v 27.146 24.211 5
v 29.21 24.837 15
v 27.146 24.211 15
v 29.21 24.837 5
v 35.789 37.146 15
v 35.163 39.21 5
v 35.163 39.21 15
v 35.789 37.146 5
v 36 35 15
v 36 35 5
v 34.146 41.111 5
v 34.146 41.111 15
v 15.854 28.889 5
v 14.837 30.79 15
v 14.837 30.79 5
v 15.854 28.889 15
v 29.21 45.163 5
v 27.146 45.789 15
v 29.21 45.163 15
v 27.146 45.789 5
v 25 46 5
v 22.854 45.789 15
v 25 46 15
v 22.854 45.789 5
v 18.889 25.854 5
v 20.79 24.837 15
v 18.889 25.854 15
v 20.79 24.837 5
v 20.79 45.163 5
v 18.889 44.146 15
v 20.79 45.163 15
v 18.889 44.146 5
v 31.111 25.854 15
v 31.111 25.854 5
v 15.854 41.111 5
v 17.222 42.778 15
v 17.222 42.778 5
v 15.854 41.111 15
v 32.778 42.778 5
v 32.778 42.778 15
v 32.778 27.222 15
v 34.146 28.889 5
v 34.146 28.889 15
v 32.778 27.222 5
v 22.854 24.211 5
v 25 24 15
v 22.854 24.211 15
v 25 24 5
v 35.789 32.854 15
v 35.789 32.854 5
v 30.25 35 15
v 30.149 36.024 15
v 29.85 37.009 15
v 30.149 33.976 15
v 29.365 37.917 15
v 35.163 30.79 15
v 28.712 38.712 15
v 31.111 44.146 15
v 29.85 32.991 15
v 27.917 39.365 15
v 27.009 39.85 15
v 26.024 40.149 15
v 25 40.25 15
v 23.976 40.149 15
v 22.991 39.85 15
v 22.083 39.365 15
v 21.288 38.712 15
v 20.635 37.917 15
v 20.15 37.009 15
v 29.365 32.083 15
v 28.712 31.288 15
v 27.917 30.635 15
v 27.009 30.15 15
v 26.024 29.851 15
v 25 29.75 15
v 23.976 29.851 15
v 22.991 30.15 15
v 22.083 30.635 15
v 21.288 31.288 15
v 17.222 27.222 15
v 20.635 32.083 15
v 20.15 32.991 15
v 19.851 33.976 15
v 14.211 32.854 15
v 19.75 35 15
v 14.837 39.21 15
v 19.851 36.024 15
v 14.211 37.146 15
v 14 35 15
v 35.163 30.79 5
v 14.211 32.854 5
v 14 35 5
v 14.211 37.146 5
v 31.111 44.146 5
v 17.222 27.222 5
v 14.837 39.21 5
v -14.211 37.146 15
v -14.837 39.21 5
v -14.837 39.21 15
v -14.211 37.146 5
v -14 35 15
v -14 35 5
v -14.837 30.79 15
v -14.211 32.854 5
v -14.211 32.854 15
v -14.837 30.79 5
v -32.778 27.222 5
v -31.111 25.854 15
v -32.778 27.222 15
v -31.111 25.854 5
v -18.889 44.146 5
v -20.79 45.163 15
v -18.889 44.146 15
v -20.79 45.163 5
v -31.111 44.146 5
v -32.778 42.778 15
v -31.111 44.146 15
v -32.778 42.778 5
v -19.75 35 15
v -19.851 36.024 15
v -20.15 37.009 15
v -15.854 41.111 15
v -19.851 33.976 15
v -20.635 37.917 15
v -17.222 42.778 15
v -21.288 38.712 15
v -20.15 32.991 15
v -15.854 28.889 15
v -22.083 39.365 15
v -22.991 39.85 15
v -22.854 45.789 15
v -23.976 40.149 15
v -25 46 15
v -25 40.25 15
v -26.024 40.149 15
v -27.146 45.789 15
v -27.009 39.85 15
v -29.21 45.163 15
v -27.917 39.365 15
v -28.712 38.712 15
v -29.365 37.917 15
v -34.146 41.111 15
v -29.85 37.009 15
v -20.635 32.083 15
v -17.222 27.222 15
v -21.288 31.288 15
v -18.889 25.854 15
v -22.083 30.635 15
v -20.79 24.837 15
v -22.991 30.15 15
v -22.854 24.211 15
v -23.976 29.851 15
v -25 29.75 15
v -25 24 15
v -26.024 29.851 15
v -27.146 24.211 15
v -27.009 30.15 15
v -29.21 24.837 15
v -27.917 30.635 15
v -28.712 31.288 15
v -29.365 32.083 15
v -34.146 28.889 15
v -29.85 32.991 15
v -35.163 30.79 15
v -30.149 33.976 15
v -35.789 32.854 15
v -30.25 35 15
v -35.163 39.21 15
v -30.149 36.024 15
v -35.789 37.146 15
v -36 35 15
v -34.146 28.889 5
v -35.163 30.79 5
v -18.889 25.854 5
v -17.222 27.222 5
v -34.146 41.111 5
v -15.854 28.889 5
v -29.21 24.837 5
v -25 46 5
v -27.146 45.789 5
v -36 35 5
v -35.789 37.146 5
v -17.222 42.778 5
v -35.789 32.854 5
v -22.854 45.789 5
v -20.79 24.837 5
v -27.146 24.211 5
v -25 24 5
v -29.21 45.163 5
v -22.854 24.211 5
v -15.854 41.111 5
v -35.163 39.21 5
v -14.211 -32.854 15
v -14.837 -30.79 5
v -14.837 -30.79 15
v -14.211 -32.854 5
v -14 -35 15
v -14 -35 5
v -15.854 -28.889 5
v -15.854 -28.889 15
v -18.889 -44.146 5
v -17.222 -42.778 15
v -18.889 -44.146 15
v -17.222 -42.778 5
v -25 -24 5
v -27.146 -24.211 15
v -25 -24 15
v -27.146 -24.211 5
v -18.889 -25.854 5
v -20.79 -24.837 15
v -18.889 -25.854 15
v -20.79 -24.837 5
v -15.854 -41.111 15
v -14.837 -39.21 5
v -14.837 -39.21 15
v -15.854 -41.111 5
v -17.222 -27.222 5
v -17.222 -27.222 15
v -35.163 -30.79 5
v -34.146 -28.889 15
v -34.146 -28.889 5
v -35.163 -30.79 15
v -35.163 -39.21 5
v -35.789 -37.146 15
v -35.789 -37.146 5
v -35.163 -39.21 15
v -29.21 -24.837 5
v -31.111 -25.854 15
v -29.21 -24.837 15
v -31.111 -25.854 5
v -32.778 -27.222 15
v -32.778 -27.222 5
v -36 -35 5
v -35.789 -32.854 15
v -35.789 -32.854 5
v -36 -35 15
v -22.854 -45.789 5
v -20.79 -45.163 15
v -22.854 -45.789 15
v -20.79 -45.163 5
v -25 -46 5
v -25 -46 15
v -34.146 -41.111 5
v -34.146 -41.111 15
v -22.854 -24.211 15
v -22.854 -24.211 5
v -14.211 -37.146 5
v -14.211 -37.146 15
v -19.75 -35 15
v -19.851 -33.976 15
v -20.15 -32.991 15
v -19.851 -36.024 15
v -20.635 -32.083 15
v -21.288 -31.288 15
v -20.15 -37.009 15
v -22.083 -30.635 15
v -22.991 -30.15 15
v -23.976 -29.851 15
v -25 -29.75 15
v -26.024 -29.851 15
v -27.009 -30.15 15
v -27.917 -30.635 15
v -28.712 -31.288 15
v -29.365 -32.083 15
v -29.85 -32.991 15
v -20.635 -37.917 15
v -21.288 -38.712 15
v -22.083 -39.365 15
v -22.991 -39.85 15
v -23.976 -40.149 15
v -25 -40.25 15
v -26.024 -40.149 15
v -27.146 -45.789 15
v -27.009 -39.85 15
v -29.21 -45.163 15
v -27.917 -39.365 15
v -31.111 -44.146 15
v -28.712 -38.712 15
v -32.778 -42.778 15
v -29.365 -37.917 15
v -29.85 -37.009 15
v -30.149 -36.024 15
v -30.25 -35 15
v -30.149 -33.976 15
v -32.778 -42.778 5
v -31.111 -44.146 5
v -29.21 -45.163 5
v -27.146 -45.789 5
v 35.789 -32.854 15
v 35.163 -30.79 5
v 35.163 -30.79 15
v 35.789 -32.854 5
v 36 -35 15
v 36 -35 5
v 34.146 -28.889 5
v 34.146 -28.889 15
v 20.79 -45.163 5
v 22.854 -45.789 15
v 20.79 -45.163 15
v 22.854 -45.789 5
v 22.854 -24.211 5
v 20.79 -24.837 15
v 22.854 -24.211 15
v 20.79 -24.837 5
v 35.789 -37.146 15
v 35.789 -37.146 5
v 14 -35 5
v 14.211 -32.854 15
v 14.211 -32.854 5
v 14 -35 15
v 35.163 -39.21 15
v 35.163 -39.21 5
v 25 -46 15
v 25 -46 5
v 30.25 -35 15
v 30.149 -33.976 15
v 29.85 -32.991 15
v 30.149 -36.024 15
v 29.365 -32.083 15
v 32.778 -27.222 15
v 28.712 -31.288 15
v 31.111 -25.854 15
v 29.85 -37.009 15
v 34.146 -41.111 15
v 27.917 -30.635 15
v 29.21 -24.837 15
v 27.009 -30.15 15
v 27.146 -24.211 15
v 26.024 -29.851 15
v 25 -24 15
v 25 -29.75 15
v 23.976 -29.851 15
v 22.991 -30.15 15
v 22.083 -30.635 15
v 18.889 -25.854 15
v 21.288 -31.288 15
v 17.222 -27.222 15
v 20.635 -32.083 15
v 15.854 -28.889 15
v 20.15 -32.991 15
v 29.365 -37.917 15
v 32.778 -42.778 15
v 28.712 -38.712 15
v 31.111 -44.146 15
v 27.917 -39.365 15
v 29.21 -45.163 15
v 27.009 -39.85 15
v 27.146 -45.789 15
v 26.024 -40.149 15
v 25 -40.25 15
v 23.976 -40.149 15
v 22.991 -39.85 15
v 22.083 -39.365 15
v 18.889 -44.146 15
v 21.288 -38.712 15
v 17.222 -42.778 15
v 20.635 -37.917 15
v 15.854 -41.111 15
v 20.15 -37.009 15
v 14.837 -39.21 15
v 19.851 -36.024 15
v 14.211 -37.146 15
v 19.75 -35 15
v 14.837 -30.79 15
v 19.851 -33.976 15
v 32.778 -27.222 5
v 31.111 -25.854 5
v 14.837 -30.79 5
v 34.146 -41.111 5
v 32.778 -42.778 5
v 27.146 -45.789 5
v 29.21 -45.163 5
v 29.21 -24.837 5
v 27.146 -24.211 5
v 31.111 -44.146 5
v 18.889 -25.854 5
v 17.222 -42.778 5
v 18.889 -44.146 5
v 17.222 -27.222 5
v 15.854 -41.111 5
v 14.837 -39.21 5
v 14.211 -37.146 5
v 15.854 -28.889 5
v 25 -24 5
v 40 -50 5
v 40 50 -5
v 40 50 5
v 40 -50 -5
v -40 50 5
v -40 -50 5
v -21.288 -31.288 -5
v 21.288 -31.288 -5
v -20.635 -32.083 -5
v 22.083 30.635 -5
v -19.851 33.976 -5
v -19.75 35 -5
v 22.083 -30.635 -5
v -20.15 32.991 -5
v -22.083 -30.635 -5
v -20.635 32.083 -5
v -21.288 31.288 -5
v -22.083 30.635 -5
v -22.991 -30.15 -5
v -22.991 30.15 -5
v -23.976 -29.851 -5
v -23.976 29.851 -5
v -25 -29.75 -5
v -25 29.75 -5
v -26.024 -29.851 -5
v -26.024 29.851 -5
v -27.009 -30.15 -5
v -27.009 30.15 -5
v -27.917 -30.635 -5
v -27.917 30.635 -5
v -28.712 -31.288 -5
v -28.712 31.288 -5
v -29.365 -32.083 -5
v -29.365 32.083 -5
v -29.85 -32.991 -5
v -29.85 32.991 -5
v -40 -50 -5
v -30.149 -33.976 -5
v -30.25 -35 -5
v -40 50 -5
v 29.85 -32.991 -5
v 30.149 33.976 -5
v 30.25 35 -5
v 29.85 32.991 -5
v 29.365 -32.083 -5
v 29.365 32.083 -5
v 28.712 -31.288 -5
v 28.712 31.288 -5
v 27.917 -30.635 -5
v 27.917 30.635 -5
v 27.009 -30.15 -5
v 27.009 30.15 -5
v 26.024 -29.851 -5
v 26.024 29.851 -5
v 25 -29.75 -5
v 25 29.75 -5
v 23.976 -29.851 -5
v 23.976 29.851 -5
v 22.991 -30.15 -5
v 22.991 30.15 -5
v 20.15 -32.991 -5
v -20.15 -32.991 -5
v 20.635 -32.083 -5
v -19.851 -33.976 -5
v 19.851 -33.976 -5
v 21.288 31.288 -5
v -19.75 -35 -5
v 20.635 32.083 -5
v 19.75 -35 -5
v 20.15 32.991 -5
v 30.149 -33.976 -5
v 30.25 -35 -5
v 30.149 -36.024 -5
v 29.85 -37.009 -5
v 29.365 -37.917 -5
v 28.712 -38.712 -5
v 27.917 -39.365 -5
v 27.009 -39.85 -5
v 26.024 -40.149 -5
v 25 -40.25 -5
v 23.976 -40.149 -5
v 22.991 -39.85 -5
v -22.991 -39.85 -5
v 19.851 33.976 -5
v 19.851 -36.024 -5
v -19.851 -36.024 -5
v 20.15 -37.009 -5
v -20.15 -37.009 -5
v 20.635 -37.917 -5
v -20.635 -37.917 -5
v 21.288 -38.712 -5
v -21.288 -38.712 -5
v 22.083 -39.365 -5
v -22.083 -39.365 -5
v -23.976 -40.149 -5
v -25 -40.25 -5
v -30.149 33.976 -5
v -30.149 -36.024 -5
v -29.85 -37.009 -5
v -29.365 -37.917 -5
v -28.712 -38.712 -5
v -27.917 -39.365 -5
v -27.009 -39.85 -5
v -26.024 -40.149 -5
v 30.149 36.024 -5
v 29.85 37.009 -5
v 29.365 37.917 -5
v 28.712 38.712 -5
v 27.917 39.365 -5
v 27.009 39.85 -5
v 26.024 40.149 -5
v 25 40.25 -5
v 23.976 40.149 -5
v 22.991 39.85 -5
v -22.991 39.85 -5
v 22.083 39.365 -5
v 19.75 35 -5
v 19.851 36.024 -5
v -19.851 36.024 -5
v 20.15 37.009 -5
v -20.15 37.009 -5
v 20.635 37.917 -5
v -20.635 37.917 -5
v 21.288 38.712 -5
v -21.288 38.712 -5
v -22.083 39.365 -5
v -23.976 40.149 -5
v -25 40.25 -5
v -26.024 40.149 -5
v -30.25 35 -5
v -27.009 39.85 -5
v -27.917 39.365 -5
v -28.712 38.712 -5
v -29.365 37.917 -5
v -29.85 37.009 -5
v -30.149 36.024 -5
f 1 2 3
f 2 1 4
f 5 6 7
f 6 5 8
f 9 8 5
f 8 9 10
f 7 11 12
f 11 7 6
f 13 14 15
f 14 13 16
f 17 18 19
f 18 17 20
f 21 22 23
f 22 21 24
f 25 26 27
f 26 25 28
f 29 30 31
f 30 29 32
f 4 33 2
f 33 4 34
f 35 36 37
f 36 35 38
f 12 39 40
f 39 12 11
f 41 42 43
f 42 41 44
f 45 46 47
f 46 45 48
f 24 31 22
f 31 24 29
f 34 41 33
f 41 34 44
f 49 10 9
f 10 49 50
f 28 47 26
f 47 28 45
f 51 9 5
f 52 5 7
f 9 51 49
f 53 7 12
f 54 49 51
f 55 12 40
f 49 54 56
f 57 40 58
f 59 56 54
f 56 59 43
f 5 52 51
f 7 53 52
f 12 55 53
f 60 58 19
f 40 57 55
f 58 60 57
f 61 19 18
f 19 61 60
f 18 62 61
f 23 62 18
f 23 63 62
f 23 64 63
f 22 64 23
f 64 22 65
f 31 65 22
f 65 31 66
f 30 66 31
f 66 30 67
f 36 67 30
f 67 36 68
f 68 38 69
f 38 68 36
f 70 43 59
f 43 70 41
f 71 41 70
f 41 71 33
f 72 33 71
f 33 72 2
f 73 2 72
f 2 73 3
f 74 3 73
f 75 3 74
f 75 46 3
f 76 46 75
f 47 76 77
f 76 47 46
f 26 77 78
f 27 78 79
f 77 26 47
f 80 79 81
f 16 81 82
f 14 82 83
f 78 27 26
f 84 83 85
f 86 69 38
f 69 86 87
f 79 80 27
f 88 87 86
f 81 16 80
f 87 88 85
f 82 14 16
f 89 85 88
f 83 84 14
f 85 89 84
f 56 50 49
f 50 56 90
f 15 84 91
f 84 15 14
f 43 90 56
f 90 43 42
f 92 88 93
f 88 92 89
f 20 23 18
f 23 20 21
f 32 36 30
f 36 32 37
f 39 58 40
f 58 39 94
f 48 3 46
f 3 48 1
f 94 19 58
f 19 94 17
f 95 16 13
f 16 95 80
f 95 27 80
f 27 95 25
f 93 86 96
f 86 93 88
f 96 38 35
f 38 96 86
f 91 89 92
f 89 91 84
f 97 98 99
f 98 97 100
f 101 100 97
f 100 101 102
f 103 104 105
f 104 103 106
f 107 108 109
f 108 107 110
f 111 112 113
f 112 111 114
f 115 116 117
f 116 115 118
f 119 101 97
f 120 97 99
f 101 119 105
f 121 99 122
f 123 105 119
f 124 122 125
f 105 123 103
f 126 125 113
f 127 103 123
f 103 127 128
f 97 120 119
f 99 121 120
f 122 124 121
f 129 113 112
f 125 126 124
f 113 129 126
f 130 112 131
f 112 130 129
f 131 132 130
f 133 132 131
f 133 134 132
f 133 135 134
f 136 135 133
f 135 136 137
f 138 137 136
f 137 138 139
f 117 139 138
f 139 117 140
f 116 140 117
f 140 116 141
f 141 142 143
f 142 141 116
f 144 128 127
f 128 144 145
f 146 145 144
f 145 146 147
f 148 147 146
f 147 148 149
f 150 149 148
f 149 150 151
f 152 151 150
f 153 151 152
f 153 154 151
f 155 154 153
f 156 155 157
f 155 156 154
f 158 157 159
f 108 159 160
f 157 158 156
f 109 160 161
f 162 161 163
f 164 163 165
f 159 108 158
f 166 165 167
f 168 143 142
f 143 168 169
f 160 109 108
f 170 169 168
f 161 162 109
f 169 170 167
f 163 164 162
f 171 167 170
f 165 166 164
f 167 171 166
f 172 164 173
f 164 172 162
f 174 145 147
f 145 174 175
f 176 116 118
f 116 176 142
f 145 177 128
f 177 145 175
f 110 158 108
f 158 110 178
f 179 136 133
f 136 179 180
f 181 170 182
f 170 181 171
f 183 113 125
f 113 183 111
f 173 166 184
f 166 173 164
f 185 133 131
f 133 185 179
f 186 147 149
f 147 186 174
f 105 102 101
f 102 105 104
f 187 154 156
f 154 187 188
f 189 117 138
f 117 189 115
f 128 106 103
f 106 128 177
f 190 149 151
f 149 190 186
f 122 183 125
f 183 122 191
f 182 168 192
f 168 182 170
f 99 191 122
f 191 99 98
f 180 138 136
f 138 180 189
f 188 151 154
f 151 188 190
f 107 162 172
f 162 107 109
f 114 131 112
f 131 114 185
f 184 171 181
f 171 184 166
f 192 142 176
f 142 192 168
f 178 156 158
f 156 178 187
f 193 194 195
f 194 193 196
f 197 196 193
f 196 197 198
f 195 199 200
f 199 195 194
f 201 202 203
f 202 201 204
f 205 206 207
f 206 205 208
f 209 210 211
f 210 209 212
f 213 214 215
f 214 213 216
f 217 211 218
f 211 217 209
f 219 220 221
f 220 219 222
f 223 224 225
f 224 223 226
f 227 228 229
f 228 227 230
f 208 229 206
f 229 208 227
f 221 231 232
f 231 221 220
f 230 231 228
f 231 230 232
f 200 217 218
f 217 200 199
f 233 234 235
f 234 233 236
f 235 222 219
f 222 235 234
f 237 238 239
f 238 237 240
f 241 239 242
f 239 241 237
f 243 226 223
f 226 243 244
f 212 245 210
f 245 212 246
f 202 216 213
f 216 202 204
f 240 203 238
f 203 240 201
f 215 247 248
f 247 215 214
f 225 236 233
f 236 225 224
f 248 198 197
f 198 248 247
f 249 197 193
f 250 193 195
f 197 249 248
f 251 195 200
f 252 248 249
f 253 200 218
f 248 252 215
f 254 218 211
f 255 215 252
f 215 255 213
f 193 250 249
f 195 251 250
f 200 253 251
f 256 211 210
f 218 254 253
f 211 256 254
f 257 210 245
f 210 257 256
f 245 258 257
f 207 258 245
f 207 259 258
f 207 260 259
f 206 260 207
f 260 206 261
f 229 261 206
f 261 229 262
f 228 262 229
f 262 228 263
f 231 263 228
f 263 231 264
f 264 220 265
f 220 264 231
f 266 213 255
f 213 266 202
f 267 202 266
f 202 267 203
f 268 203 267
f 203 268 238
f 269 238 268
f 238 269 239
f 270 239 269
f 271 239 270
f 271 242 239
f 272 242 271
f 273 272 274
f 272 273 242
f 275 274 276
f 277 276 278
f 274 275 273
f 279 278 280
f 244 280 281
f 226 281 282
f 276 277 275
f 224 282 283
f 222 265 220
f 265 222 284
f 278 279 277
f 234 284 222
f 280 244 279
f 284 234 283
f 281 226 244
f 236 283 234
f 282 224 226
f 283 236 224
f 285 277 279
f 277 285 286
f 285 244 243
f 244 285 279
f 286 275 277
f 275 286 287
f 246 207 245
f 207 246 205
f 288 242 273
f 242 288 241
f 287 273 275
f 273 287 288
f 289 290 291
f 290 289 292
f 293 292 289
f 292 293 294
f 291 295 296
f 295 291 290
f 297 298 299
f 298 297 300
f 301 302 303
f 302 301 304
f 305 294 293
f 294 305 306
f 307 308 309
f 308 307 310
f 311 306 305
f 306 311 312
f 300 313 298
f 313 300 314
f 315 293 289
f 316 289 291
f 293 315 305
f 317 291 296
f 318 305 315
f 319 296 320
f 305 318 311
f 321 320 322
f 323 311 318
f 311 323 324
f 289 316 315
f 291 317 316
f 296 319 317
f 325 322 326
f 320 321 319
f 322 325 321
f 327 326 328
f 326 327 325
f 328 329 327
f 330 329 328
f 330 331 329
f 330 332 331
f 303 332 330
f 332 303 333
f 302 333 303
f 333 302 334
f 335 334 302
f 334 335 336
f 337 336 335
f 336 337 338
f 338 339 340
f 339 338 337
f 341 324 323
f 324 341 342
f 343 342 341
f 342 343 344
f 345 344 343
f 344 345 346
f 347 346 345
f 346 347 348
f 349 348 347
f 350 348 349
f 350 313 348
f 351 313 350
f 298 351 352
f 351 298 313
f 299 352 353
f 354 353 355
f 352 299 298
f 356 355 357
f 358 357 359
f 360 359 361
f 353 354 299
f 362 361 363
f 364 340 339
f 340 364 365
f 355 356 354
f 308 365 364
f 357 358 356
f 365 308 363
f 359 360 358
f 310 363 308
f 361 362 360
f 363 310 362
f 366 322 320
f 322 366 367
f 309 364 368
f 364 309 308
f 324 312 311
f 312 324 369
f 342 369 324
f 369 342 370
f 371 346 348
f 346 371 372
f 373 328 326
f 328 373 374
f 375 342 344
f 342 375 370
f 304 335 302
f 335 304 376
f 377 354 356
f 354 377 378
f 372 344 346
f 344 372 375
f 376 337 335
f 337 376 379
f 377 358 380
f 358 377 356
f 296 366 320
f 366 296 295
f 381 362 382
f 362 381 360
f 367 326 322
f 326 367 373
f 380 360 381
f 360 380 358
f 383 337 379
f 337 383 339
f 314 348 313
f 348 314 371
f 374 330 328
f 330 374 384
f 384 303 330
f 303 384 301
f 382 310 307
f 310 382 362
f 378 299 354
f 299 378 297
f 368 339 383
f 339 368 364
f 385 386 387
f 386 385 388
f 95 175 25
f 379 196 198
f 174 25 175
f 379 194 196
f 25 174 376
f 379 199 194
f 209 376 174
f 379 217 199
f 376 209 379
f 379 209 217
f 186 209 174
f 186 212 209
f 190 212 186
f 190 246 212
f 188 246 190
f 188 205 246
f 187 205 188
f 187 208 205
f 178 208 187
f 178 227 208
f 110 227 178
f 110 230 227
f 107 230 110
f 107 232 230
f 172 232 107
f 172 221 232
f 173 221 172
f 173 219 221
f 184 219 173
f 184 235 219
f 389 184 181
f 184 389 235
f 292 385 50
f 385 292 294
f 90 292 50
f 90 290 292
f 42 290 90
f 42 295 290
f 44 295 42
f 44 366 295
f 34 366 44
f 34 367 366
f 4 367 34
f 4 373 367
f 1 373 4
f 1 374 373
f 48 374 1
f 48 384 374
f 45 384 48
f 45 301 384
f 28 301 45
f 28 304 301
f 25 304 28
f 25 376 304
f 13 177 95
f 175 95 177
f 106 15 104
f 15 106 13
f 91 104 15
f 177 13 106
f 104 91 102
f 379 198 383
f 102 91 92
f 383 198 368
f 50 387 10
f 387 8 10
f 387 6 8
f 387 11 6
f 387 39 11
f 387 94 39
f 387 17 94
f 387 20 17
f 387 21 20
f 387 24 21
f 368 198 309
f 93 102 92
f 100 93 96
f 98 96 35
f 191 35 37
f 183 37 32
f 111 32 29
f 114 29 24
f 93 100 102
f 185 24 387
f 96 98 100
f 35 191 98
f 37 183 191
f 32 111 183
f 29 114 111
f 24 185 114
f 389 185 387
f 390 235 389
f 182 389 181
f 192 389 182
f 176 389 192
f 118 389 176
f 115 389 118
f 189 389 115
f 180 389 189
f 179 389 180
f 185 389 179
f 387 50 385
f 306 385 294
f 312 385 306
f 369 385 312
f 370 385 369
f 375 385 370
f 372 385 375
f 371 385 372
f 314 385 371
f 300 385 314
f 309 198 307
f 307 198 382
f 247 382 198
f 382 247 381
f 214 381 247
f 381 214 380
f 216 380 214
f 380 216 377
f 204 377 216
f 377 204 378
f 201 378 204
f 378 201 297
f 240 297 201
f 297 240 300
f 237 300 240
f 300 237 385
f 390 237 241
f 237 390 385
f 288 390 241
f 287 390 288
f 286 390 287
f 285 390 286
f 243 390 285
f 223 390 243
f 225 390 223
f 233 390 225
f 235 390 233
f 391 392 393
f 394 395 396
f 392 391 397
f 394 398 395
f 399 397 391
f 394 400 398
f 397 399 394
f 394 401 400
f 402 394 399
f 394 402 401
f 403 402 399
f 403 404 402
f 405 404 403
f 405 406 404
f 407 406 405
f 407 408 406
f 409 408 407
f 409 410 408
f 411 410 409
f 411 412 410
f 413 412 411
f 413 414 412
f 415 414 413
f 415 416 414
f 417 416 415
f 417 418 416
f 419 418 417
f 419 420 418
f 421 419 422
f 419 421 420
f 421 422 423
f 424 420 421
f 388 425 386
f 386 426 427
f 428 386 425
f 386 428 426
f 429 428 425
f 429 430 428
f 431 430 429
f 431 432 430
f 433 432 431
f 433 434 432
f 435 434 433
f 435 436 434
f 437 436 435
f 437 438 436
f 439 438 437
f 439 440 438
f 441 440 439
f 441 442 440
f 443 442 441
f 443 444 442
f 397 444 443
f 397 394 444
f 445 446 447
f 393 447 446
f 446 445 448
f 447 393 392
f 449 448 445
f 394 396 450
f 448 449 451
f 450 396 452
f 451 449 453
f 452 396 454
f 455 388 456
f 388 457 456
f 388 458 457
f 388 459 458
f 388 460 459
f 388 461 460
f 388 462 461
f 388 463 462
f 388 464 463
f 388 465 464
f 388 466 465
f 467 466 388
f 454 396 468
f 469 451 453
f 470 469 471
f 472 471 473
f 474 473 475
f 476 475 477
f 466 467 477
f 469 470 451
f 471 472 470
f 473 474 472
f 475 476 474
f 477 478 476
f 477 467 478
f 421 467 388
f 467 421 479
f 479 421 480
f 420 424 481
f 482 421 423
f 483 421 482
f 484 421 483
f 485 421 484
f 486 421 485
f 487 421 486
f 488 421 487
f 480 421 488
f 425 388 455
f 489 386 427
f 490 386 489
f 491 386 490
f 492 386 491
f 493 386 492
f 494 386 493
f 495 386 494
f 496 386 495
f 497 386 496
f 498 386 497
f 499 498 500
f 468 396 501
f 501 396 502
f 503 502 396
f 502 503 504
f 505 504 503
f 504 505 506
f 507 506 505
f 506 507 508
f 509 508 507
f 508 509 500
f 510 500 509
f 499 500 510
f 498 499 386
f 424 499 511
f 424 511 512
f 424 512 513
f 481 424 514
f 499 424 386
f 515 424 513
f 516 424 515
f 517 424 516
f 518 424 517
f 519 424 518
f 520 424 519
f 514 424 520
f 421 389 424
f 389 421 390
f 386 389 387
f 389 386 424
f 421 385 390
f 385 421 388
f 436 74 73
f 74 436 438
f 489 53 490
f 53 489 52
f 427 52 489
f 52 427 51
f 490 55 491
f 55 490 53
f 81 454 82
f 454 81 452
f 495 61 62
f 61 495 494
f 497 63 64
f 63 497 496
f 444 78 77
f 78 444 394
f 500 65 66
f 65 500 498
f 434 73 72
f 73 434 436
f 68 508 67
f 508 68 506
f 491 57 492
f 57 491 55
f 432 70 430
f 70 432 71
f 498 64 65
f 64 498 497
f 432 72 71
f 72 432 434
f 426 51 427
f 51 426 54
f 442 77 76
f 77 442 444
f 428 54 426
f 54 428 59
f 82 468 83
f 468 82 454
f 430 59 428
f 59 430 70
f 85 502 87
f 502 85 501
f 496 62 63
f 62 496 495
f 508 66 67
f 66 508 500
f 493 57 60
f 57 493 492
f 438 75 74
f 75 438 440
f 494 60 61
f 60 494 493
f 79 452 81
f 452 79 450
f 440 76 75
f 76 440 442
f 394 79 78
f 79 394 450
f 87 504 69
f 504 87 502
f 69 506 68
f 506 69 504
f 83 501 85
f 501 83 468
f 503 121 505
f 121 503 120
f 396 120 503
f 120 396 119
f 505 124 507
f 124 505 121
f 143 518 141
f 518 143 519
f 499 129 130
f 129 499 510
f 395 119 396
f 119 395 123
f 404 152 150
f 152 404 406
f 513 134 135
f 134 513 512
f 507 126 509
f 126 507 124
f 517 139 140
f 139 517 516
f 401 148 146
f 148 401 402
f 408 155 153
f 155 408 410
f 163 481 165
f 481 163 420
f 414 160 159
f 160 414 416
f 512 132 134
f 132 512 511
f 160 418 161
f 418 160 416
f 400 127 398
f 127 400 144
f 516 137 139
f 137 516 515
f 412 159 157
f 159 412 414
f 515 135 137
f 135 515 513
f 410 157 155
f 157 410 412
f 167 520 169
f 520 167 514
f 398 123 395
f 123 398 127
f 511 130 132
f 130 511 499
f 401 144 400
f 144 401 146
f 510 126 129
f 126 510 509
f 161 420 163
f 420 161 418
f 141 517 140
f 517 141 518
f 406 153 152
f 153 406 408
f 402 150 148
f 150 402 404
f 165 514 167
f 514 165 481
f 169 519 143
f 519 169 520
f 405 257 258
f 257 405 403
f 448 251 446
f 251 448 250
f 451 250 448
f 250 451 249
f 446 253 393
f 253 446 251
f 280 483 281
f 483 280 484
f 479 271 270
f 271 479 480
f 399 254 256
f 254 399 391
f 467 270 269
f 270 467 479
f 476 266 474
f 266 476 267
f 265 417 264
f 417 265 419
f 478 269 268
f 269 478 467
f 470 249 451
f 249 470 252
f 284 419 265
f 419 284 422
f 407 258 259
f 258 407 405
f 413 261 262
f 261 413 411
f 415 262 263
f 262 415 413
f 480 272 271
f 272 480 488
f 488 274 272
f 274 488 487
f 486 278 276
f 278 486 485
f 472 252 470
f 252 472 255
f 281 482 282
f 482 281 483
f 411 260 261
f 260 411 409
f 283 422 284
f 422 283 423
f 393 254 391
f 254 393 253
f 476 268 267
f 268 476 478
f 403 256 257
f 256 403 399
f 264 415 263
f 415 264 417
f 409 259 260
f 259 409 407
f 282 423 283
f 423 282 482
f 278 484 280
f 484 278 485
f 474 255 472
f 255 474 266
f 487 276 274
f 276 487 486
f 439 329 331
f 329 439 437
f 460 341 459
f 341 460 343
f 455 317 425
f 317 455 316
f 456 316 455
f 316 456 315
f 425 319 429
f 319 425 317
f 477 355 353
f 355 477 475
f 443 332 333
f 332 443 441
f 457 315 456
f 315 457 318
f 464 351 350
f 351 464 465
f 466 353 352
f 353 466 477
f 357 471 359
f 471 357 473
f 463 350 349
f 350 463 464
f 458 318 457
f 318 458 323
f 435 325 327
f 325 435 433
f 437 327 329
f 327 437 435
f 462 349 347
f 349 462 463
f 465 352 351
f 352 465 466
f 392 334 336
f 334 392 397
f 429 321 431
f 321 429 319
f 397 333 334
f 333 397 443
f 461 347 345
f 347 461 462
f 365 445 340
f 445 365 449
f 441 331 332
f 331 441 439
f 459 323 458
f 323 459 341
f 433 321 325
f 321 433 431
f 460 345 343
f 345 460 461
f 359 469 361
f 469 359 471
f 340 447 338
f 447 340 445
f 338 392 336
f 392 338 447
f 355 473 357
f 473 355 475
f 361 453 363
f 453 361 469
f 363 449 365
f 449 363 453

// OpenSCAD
$fn = 32;

// ----------------------------------------------------------------------
// Anchor pads 80 x 100 x 20
// four corner bosses with anchor holes
// ----------------------------------------------------------------------

// --- parameters (mm) ---
plate = [80, 100, 10];  // base plate size (x, y, z)
pads = 4;               // boss count, one per corner
edge = 15;              // boss centre offset from the plate edge
boss_d = 22;            // boss diameter
boss_h = 10;            // boss height above the base plate
hole_d = 10.5;          // hole diameter

// --- derived feature positions (mm) ---
height = plate[2] + boss_h;      // = 20   overall height of the part
corner_x = plate[0] / 2 - edge;  // = 25   boss centre X
corner_y = plate[1] / 2 - edge;  // = 35   boss centre Y
feature_centers = [
  [corner_x, corner_y],
  [-corner_x, corner_y],
  [-corner_x, -corner_y],
  [corner_x, -corner_y]
];   // boss centres, anchor holes are drilled there

// base plate, four bosses standing on it, anchor holes all the way through
difference() {
  union() {
    cube(plate, center = true);
    for (centre = feature_centers)
      translate([centre[0], centre[1], plate[2] / 2 - 1])
        cylinder(d = boss_d, h = boss_h + 1);
  }
  for (centre = feature_centers)
    translate([centre[0], centre[1], -height])
      cylinder(d = hole_d, h = 2 * height + 2);  // through boss and plate
}
